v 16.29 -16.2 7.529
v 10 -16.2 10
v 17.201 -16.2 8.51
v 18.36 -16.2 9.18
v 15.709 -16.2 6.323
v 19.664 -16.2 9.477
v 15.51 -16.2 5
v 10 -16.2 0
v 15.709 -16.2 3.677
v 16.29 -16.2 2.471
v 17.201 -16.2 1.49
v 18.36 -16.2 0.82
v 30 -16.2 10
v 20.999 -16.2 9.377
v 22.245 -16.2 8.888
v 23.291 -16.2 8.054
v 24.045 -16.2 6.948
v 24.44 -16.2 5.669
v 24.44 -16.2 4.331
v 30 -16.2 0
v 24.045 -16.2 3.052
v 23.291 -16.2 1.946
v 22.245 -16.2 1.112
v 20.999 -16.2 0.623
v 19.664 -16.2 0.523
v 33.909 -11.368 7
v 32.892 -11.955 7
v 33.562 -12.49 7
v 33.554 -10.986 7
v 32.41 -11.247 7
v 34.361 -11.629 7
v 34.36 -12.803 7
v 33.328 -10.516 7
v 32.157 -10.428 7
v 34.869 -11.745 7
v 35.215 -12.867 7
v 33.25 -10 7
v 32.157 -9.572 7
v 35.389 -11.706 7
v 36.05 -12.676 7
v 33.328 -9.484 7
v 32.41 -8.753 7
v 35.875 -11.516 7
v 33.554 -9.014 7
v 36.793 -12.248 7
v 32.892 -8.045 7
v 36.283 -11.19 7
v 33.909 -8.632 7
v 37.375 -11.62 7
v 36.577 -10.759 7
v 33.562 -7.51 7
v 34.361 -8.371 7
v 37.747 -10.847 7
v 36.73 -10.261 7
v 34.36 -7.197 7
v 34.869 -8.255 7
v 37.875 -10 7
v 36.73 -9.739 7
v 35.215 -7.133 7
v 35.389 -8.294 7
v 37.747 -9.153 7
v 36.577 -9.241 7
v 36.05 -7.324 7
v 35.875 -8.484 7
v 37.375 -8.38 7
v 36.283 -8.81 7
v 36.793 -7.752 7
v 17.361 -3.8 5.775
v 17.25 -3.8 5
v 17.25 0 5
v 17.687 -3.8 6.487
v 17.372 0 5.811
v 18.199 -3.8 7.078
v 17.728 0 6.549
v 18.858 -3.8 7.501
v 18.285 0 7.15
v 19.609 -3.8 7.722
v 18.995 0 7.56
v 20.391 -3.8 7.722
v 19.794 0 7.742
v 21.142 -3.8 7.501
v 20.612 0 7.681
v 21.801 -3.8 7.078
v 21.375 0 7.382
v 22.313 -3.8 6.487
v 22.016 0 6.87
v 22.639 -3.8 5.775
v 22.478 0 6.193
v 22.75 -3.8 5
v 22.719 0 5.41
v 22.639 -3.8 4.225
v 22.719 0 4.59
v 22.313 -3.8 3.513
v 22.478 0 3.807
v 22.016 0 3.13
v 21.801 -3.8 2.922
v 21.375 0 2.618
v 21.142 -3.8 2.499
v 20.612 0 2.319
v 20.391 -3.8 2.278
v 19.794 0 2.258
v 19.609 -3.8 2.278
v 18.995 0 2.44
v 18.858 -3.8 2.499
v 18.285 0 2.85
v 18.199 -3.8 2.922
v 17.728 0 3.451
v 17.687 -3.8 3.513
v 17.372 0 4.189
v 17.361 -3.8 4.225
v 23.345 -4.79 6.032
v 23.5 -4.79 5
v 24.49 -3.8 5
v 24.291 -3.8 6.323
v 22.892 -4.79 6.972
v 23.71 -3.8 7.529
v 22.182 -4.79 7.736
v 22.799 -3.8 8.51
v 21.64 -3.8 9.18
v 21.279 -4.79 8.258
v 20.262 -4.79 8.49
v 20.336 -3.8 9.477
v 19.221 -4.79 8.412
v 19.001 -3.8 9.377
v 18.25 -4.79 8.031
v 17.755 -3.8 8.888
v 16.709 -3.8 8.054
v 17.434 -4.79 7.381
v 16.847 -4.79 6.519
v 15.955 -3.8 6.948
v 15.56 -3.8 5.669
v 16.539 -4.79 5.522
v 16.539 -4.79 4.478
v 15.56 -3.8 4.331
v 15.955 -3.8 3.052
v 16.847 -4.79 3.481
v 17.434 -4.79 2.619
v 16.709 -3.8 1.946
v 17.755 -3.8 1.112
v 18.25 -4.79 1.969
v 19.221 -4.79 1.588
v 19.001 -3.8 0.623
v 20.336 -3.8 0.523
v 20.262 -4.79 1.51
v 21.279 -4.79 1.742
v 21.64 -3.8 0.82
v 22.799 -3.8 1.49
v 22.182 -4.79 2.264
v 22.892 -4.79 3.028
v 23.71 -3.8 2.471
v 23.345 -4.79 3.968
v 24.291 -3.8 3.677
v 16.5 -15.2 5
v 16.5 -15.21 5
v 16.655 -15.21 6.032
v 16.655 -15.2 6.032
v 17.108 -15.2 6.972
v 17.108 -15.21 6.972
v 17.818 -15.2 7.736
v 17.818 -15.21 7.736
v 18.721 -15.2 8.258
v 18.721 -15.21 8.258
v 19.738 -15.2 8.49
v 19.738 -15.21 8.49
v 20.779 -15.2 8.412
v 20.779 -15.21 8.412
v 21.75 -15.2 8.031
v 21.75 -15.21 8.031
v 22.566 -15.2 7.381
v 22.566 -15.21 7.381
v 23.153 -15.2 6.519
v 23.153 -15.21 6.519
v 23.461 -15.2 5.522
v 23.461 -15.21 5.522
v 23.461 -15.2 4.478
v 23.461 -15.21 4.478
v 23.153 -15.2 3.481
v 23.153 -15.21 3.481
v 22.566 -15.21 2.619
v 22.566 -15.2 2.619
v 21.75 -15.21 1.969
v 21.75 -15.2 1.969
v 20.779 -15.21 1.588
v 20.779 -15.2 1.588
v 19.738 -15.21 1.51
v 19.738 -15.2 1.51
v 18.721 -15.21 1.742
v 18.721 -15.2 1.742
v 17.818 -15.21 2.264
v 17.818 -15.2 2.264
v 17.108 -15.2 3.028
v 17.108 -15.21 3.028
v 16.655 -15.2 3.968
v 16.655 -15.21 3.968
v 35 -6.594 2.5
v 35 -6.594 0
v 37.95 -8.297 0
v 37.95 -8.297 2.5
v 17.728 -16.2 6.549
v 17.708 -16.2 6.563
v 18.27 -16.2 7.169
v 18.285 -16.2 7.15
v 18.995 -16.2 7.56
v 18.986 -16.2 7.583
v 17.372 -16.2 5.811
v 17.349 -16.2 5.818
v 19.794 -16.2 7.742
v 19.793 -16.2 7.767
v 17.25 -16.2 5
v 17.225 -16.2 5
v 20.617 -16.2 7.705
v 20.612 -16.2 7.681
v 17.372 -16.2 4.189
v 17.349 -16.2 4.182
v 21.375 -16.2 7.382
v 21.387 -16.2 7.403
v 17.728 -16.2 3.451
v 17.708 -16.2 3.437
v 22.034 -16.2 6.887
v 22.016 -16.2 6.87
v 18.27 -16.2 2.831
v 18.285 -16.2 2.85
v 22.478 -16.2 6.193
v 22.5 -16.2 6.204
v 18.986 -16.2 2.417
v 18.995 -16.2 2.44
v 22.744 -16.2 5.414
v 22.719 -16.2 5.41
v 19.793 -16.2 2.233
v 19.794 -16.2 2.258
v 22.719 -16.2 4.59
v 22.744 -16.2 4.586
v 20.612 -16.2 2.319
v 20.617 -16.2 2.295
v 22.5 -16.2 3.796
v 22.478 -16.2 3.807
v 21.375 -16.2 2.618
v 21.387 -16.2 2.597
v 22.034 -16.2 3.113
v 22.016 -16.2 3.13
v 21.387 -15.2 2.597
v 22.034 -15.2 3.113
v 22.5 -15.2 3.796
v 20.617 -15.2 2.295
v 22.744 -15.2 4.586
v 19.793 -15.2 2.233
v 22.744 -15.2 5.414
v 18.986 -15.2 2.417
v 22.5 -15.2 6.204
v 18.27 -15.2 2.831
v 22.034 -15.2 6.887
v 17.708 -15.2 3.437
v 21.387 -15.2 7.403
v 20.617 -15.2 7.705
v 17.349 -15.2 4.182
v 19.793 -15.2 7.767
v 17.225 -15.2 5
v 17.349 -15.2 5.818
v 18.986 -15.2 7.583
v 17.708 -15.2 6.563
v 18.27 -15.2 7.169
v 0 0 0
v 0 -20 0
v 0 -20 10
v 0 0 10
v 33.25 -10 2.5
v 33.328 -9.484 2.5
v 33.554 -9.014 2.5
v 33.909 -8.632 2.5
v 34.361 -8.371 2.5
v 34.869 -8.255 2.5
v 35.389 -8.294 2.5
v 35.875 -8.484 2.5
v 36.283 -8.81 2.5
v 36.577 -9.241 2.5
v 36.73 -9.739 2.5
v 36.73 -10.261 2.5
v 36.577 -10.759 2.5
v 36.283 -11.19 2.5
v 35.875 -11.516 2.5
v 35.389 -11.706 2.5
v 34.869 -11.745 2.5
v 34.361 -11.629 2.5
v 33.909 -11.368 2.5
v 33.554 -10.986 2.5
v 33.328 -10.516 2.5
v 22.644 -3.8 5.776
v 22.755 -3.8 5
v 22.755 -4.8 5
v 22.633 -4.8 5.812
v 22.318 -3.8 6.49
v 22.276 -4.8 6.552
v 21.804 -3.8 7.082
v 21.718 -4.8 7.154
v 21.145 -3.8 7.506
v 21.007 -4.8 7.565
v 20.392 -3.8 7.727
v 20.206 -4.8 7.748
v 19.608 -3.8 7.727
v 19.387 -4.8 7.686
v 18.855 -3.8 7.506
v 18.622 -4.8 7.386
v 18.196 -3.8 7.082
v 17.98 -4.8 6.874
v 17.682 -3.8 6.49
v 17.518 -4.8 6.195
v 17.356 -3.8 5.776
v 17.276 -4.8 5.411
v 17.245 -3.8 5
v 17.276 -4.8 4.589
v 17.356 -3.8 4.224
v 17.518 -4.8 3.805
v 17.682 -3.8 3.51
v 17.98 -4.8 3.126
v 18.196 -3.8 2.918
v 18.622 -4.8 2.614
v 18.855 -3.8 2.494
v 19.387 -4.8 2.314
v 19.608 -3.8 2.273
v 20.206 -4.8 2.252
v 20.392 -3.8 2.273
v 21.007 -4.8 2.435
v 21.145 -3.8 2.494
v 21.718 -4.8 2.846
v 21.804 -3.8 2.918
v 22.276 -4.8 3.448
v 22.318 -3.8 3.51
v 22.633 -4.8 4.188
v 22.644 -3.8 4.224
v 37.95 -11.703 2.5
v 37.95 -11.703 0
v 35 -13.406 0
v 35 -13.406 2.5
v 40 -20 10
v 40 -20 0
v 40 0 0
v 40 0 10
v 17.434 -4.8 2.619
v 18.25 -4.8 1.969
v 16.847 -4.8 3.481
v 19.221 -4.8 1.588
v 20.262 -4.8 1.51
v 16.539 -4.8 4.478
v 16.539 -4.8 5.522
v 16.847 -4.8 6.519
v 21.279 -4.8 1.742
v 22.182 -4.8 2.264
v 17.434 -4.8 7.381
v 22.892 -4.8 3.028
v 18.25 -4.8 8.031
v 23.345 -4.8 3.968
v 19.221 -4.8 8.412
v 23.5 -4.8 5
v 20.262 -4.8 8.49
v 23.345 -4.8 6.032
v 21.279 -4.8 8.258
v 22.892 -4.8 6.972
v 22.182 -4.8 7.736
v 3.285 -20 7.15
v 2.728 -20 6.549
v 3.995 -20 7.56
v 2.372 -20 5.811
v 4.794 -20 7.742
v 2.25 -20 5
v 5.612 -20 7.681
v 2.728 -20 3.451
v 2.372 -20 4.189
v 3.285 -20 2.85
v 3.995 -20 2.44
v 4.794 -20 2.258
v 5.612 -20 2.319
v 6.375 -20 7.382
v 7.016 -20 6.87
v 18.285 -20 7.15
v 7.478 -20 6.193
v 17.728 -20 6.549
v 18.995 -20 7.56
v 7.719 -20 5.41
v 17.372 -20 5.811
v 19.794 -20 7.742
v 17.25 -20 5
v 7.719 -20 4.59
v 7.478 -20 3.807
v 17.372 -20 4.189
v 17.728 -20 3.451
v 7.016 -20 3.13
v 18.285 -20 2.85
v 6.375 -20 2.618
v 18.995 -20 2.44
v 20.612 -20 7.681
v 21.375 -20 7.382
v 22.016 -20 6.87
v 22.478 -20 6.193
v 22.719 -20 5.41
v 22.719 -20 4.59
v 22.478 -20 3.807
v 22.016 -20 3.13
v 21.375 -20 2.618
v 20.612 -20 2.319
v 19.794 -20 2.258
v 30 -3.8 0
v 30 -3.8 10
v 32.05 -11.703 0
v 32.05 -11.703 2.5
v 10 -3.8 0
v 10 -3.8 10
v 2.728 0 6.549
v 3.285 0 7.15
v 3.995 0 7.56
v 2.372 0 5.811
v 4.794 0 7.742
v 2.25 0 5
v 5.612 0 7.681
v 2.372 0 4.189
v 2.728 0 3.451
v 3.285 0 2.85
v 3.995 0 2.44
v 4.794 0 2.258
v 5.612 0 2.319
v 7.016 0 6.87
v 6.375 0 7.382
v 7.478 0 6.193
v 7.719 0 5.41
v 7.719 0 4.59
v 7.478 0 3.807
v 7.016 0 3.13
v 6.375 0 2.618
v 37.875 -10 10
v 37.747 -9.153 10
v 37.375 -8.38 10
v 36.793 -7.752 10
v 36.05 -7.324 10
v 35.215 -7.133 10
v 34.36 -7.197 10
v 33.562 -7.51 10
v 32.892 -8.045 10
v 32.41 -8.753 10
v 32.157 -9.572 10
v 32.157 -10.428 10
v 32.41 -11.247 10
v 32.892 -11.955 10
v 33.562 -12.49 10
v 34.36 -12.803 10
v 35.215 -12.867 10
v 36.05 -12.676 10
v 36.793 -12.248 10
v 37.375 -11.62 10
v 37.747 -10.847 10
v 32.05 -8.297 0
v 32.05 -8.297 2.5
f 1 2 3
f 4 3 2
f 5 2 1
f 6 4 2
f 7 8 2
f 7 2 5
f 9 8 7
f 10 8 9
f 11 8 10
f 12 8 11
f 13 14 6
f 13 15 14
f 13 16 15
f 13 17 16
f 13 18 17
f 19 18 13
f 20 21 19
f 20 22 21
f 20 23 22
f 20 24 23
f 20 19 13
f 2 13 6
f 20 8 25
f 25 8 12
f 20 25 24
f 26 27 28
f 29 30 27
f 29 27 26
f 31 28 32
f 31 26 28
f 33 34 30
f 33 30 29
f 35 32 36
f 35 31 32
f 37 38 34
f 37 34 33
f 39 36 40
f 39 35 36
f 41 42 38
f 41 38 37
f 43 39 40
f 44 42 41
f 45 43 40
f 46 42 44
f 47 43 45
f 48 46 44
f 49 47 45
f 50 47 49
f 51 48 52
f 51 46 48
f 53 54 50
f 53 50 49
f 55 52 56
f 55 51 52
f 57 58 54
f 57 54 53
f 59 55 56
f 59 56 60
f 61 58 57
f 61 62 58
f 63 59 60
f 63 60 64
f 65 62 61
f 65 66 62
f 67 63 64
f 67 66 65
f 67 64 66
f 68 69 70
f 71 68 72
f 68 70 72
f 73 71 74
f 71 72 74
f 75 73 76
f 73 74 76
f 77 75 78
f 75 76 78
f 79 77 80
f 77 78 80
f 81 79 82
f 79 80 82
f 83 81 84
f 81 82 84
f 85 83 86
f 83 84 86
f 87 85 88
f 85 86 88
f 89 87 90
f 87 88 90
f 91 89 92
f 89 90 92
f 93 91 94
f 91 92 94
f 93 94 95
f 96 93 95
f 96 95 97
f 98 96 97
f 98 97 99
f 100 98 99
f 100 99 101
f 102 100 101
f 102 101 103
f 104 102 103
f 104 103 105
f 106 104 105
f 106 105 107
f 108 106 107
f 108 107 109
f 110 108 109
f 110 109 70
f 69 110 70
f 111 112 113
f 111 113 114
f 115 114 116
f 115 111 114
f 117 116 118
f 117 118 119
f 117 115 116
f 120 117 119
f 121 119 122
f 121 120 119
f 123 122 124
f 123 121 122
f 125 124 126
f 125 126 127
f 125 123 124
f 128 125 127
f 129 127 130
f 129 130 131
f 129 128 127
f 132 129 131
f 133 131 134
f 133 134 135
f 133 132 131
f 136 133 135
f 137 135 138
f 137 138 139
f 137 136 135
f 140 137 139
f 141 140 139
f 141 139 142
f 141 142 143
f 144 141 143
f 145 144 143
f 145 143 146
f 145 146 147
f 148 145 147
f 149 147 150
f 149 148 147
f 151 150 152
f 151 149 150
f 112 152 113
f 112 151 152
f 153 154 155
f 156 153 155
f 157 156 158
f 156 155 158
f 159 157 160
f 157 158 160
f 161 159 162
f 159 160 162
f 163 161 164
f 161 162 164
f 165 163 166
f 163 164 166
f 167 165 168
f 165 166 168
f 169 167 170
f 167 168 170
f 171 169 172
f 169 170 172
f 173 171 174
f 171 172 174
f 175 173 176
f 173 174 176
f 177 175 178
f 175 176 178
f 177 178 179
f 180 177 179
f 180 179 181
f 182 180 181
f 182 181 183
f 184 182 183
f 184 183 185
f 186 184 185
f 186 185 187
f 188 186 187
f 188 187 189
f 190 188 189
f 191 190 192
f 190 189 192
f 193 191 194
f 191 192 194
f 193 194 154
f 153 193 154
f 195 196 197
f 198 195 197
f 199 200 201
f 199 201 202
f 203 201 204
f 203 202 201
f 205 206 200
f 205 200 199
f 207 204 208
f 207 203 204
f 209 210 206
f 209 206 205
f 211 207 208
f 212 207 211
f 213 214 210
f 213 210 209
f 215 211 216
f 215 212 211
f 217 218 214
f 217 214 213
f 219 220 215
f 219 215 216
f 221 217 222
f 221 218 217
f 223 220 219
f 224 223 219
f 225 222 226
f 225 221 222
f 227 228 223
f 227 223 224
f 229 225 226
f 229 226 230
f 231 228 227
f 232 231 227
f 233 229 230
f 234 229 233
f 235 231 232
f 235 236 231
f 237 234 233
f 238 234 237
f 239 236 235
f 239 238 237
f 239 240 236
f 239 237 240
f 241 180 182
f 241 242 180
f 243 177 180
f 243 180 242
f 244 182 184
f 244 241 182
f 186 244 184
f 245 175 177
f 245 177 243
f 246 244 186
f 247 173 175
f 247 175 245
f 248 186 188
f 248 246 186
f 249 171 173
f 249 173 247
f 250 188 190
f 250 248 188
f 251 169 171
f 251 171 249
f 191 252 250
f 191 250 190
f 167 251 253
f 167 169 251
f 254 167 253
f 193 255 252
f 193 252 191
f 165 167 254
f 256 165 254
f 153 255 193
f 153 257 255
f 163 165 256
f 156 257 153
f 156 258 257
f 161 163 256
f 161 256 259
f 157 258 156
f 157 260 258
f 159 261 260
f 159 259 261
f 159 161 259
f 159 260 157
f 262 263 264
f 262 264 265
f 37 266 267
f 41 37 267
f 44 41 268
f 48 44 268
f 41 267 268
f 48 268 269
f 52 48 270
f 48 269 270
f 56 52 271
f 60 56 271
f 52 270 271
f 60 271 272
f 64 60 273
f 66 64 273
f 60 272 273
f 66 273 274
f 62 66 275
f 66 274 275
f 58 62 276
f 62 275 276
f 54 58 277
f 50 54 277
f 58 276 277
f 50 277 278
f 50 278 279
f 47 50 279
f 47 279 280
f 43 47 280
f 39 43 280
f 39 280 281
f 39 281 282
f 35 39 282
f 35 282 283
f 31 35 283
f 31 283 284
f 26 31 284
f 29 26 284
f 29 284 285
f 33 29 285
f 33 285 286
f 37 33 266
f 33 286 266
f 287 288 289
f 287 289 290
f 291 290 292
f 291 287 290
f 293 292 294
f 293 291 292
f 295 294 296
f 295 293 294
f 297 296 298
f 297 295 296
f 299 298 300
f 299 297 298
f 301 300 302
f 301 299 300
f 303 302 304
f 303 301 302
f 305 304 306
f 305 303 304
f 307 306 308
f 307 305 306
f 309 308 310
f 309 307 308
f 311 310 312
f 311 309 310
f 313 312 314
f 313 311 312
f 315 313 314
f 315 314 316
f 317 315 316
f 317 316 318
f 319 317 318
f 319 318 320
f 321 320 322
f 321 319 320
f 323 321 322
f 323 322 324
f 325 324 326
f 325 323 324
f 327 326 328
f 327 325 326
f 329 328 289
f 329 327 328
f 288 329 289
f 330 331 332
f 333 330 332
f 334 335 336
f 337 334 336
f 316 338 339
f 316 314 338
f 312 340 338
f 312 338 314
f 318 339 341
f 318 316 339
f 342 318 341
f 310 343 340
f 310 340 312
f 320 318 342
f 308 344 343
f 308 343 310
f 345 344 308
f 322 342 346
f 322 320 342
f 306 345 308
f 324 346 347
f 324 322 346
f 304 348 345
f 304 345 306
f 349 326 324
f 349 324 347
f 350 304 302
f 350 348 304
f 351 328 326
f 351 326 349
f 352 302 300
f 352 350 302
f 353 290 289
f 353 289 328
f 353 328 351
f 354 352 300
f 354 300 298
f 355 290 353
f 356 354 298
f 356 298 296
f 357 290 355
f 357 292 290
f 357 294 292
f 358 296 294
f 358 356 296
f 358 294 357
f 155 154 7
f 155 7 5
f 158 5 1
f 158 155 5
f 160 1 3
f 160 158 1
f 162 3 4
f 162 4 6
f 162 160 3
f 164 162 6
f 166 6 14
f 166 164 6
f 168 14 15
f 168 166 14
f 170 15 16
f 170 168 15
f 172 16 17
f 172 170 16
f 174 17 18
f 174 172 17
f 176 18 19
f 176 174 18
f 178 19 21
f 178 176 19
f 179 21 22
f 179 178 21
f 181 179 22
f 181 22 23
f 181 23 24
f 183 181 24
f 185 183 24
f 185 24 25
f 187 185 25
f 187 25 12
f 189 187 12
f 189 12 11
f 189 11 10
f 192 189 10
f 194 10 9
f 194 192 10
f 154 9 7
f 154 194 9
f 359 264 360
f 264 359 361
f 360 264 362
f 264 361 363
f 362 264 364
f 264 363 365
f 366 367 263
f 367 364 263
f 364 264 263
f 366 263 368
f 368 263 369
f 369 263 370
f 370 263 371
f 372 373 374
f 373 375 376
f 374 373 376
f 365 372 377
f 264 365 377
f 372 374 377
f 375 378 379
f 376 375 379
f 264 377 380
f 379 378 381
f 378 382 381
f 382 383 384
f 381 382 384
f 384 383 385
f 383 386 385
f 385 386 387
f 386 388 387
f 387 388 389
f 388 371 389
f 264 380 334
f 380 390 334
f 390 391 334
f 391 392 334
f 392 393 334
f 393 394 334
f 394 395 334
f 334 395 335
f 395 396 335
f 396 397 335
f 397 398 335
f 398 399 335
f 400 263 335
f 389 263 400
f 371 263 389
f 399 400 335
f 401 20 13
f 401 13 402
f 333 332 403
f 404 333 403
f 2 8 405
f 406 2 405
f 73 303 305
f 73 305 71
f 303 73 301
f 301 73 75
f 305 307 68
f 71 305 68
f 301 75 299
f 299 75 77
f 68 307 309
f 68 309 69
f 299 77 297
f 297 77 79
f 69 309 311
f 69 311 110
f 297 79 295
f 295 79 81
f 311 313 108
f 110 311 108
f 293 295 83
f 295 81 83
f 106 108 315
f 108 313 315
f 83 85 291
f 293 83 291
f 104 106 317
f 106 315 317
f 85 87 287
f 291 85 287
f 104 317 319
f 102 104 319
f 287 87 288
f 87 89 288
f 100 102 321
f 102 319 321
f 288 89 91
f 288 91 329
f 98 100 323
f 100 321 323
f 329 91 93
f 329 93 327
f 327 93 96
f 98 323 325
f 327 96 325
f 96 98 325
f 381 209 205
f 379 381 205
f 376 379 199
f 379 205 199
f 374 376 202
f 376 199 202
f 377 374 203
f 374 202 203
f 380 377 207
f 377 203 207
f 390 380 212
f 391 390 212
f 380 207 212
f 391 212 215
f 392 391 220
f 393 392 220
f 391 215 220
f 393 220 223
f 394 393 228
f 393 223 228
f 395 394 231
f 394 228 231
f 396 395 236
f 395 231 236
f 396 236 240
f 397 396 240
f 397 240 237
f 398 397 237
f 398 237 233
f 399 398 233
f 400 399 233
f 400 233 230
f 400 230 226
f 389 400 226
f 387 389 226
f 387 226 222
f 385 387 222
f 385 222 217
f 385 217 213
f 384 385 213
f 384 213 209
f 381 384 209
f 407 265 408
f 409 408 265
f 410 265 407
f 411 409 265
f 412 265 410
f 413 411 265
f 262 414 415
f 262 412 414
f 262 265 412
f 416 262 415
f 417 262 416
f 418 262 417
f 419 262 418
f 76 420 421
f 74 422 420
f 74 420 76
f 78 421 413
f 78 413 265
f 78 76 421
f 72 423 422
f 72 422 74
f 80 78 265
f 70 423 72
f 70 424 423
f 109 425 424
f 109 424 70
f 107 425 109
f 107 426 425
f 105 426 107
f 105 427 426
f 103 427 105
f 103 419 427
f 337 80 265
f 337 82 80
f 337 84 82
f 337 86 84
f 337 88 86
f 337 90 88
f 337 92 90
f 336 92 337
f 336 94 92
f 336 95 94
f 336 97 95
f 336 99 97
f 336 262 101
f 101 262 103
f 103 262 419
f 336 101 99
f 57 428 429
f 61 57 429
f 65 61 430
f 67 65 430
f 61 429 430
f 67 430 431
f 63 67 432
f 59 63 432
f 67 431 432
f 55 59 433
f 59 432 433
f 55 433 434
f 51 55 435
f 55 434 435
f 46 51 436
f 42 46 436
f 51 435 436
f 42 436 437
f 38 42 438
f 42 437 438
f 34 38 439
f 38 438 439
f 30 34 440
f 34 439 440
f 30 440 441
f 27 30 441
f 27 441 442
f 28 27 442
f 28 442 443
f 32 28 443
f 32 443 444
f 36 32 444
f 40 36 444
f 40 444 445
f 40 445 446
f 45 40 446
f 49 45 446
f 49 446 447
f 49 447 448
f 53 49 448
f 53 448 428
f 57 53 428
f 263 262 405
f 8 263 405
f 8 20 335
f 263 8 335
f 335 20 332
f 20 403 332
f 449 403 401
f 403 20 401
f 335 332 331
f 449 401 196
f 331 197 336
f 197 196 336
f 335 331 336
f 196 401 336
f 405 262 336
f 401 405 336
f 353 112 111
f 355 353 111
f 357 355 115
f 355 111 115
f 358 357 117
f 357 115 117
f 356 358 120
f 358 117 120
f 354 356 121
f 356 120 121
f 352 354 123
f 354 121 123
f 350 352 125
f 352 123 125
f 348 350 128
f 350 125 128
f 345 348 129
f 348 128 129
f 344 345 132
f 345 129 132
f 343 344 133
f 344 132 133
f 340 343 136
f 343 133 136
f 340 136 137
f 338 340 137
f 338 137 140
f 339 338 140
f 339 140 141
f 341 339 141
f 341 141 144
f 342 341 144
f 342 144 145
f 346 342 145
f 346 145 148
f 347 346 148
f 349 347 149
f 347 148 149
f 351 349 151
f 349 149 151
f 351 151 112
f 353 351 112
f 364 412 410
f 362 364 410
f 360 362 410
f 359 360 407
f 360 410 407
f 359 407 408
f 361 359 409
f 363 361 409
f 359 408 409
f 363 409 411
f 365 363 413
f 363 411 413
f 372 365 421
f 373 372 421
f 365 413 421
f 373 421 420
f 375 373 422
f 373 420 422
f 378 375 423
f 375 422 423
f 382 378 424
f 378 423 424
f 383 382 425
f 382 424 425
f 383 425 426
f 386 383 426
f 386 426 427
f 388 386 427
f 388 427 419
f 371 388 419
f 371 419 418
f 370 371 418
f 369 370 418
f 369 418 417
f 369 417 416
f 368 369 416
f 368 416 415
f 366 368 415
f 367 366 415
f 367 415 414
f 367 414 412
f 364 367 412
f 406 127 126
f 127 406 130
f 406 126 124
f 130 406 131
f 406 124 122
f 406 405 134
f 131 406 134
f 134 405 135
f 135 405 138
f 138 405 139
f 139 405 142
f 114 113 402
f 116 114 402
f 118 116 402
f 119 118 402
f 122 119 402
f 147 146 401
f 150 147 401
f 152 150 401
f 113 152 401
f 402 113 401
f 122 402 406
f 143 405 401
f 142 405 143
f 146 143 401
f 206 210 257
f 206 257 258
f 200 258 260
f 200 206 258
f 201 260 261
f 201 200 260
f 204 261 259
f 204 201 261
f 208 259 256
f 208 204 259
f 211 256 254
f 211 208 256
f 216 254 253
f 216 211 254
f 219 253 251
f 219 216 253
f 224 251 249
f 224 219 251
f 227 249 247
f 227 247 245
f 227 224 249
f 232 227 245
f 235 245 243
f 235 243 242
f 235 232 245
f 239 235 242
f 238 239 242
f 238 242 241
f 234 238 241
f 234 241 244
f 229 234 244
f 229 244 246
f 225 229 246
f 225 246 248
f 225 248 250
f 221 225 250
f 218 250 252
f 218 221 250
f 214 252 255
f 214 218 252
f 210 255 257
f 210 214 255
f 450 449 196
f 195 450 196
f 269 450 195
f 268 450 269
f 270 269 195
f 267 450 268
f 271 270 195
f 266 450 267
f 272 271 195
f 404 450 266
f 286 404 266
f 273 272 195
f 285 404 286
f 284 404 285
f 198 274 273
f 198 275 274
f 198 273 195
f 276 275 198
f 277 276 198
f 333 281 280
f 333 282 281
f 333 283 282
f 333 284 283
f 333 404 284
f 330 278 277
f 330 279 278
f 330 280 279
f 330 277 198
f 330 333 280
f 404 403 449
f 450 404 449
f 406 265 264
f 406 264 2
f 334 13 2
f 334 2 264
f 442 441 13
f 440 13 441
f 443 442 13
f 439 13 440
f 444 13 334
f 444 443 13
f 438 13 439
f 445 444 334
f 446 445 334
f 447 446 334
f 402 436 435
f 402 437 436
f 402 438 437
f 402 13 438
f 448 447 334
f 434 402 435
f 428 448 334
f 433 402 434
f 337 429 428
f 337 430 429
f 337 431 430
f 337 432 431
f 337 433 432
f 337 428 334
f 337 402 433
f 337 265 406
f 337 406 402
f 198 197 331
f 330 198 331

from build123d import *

# Parameters (mm, degrees)
SKETCH_W         = 40
SKETCH_H         = 20
SKETCH_W_2       = 20
SKETCH_H_2       = 12.4
PAD_DEPTH        = 10
HOLE_D           = 3.5
HOLE_DEPTH       = 25
HOLE_CBORE_D     = 5.75
HOLE_CBORE_DEPTH = 3
POCKET_DEPTH     = 2.5
SKETCH003_R      = 2.75
POCKET001_DEPTH  = 20.001
SKETCH004_R      = 3.5
SKETCH004_R_2    = 2.774564
PAD001_DEPTH     = 1
SKETCH005_R      = 3.5
SKETCH005_R_2    = 2.755211
PAD002_DEPTH     = 1
CHAMFER_SIZE     = 0.99


with BuildPart() as part:
    # Sketch → Pad (new body)
    with BuildSketch(Plane.XY):
        with Locations((20, -10)):
            Rectangle(SKETCH_W, SKETCH_H)
        with Locations((20, -10)):
            Rectangle(SKETCH_W_2, SKETCH_H_2, mode=Mode.SUBTRACT)
    extrude(amount=PAD_DEPTH)

    # Hole
    with Locations(Plane.XY.offset(10)):
        with Locations((35, -10)):
            CounterBoreHole(HOLE_D / 2, HOLE_CBORE_D / 2, HOLE_CBORE_DEPTH, depth=HOLE_DEPTH)

    # Sketch002 (on Face4 of Hole) → Pocket (cut)
    with BuildSketch(Plane(origin=(0, 0, 0), x_dir=(1, 0, 0), z_dir=(0, 0, -1))):
        Polygon((37.95, 11.703183), (35, 13.406367), (32.05, 11.703183), (32.05, 8.296817), (35, 6.593633), (37.95, 8.296817), align=None)
    extrude(amount=-POCKET_DEPTH, mode=Mode.SUBTRACT)

    # Sketch003 (on Face1 of Pocket) → Pocket001 (cut, through all)
    with BuildSketch(Plane(origin=(0, 0, 0), x_dir=(-1, 0, 0), z_dir=(0, 1, 0))):
        with Locations((-5, 5)):
            Circle(SKETCH003_R)
        with Locations((-20, 5)):
            Circle(SKETCH003_R)
    extrude(amount=-POCKET001_DEPTH, mode=Mode.SUBTRACT)

    # Sketch004 (on Face16 of Pocket001) → Pad001 (join)
    with BuildSketch(Plane(origin=(0, -16.2, 0), x_dir=(-1, 0, 0), z_dir=(0, 1, 0))):
        with Locations((-20, 5)):
            Circle(SKETCH004_R)
        with Locations((-20, 5)):
            Circle(SKETCH004_R_2, mode=Mode.SUBTRACT)
    extrude(amount=PAD001_DEPTH)

    # Sketch005 (on Face17 of Pad001) → Pad002 (join)
    with BuildSketch(Plane.XZ.offset(3.8)):
        with Locations((20, 5)):
            Circle(SKETCH005_R)
        with Locations((20, 5)):
            Circle(SKETCH005_R_2, mode=Mode.SUBTRACT)
    extrude(amount=PAD002_DEPTH)

    # Chamfer
    chamfer_edges = [part.edges().sort_by_distance(p)[0] for p in [
        (16.5, -3.8, 5),
        (23.5, -16.2, 5),
    ]]
    chamfer(chamfer_edges, length=CHAMFER_SIZE)


solid = part.part
